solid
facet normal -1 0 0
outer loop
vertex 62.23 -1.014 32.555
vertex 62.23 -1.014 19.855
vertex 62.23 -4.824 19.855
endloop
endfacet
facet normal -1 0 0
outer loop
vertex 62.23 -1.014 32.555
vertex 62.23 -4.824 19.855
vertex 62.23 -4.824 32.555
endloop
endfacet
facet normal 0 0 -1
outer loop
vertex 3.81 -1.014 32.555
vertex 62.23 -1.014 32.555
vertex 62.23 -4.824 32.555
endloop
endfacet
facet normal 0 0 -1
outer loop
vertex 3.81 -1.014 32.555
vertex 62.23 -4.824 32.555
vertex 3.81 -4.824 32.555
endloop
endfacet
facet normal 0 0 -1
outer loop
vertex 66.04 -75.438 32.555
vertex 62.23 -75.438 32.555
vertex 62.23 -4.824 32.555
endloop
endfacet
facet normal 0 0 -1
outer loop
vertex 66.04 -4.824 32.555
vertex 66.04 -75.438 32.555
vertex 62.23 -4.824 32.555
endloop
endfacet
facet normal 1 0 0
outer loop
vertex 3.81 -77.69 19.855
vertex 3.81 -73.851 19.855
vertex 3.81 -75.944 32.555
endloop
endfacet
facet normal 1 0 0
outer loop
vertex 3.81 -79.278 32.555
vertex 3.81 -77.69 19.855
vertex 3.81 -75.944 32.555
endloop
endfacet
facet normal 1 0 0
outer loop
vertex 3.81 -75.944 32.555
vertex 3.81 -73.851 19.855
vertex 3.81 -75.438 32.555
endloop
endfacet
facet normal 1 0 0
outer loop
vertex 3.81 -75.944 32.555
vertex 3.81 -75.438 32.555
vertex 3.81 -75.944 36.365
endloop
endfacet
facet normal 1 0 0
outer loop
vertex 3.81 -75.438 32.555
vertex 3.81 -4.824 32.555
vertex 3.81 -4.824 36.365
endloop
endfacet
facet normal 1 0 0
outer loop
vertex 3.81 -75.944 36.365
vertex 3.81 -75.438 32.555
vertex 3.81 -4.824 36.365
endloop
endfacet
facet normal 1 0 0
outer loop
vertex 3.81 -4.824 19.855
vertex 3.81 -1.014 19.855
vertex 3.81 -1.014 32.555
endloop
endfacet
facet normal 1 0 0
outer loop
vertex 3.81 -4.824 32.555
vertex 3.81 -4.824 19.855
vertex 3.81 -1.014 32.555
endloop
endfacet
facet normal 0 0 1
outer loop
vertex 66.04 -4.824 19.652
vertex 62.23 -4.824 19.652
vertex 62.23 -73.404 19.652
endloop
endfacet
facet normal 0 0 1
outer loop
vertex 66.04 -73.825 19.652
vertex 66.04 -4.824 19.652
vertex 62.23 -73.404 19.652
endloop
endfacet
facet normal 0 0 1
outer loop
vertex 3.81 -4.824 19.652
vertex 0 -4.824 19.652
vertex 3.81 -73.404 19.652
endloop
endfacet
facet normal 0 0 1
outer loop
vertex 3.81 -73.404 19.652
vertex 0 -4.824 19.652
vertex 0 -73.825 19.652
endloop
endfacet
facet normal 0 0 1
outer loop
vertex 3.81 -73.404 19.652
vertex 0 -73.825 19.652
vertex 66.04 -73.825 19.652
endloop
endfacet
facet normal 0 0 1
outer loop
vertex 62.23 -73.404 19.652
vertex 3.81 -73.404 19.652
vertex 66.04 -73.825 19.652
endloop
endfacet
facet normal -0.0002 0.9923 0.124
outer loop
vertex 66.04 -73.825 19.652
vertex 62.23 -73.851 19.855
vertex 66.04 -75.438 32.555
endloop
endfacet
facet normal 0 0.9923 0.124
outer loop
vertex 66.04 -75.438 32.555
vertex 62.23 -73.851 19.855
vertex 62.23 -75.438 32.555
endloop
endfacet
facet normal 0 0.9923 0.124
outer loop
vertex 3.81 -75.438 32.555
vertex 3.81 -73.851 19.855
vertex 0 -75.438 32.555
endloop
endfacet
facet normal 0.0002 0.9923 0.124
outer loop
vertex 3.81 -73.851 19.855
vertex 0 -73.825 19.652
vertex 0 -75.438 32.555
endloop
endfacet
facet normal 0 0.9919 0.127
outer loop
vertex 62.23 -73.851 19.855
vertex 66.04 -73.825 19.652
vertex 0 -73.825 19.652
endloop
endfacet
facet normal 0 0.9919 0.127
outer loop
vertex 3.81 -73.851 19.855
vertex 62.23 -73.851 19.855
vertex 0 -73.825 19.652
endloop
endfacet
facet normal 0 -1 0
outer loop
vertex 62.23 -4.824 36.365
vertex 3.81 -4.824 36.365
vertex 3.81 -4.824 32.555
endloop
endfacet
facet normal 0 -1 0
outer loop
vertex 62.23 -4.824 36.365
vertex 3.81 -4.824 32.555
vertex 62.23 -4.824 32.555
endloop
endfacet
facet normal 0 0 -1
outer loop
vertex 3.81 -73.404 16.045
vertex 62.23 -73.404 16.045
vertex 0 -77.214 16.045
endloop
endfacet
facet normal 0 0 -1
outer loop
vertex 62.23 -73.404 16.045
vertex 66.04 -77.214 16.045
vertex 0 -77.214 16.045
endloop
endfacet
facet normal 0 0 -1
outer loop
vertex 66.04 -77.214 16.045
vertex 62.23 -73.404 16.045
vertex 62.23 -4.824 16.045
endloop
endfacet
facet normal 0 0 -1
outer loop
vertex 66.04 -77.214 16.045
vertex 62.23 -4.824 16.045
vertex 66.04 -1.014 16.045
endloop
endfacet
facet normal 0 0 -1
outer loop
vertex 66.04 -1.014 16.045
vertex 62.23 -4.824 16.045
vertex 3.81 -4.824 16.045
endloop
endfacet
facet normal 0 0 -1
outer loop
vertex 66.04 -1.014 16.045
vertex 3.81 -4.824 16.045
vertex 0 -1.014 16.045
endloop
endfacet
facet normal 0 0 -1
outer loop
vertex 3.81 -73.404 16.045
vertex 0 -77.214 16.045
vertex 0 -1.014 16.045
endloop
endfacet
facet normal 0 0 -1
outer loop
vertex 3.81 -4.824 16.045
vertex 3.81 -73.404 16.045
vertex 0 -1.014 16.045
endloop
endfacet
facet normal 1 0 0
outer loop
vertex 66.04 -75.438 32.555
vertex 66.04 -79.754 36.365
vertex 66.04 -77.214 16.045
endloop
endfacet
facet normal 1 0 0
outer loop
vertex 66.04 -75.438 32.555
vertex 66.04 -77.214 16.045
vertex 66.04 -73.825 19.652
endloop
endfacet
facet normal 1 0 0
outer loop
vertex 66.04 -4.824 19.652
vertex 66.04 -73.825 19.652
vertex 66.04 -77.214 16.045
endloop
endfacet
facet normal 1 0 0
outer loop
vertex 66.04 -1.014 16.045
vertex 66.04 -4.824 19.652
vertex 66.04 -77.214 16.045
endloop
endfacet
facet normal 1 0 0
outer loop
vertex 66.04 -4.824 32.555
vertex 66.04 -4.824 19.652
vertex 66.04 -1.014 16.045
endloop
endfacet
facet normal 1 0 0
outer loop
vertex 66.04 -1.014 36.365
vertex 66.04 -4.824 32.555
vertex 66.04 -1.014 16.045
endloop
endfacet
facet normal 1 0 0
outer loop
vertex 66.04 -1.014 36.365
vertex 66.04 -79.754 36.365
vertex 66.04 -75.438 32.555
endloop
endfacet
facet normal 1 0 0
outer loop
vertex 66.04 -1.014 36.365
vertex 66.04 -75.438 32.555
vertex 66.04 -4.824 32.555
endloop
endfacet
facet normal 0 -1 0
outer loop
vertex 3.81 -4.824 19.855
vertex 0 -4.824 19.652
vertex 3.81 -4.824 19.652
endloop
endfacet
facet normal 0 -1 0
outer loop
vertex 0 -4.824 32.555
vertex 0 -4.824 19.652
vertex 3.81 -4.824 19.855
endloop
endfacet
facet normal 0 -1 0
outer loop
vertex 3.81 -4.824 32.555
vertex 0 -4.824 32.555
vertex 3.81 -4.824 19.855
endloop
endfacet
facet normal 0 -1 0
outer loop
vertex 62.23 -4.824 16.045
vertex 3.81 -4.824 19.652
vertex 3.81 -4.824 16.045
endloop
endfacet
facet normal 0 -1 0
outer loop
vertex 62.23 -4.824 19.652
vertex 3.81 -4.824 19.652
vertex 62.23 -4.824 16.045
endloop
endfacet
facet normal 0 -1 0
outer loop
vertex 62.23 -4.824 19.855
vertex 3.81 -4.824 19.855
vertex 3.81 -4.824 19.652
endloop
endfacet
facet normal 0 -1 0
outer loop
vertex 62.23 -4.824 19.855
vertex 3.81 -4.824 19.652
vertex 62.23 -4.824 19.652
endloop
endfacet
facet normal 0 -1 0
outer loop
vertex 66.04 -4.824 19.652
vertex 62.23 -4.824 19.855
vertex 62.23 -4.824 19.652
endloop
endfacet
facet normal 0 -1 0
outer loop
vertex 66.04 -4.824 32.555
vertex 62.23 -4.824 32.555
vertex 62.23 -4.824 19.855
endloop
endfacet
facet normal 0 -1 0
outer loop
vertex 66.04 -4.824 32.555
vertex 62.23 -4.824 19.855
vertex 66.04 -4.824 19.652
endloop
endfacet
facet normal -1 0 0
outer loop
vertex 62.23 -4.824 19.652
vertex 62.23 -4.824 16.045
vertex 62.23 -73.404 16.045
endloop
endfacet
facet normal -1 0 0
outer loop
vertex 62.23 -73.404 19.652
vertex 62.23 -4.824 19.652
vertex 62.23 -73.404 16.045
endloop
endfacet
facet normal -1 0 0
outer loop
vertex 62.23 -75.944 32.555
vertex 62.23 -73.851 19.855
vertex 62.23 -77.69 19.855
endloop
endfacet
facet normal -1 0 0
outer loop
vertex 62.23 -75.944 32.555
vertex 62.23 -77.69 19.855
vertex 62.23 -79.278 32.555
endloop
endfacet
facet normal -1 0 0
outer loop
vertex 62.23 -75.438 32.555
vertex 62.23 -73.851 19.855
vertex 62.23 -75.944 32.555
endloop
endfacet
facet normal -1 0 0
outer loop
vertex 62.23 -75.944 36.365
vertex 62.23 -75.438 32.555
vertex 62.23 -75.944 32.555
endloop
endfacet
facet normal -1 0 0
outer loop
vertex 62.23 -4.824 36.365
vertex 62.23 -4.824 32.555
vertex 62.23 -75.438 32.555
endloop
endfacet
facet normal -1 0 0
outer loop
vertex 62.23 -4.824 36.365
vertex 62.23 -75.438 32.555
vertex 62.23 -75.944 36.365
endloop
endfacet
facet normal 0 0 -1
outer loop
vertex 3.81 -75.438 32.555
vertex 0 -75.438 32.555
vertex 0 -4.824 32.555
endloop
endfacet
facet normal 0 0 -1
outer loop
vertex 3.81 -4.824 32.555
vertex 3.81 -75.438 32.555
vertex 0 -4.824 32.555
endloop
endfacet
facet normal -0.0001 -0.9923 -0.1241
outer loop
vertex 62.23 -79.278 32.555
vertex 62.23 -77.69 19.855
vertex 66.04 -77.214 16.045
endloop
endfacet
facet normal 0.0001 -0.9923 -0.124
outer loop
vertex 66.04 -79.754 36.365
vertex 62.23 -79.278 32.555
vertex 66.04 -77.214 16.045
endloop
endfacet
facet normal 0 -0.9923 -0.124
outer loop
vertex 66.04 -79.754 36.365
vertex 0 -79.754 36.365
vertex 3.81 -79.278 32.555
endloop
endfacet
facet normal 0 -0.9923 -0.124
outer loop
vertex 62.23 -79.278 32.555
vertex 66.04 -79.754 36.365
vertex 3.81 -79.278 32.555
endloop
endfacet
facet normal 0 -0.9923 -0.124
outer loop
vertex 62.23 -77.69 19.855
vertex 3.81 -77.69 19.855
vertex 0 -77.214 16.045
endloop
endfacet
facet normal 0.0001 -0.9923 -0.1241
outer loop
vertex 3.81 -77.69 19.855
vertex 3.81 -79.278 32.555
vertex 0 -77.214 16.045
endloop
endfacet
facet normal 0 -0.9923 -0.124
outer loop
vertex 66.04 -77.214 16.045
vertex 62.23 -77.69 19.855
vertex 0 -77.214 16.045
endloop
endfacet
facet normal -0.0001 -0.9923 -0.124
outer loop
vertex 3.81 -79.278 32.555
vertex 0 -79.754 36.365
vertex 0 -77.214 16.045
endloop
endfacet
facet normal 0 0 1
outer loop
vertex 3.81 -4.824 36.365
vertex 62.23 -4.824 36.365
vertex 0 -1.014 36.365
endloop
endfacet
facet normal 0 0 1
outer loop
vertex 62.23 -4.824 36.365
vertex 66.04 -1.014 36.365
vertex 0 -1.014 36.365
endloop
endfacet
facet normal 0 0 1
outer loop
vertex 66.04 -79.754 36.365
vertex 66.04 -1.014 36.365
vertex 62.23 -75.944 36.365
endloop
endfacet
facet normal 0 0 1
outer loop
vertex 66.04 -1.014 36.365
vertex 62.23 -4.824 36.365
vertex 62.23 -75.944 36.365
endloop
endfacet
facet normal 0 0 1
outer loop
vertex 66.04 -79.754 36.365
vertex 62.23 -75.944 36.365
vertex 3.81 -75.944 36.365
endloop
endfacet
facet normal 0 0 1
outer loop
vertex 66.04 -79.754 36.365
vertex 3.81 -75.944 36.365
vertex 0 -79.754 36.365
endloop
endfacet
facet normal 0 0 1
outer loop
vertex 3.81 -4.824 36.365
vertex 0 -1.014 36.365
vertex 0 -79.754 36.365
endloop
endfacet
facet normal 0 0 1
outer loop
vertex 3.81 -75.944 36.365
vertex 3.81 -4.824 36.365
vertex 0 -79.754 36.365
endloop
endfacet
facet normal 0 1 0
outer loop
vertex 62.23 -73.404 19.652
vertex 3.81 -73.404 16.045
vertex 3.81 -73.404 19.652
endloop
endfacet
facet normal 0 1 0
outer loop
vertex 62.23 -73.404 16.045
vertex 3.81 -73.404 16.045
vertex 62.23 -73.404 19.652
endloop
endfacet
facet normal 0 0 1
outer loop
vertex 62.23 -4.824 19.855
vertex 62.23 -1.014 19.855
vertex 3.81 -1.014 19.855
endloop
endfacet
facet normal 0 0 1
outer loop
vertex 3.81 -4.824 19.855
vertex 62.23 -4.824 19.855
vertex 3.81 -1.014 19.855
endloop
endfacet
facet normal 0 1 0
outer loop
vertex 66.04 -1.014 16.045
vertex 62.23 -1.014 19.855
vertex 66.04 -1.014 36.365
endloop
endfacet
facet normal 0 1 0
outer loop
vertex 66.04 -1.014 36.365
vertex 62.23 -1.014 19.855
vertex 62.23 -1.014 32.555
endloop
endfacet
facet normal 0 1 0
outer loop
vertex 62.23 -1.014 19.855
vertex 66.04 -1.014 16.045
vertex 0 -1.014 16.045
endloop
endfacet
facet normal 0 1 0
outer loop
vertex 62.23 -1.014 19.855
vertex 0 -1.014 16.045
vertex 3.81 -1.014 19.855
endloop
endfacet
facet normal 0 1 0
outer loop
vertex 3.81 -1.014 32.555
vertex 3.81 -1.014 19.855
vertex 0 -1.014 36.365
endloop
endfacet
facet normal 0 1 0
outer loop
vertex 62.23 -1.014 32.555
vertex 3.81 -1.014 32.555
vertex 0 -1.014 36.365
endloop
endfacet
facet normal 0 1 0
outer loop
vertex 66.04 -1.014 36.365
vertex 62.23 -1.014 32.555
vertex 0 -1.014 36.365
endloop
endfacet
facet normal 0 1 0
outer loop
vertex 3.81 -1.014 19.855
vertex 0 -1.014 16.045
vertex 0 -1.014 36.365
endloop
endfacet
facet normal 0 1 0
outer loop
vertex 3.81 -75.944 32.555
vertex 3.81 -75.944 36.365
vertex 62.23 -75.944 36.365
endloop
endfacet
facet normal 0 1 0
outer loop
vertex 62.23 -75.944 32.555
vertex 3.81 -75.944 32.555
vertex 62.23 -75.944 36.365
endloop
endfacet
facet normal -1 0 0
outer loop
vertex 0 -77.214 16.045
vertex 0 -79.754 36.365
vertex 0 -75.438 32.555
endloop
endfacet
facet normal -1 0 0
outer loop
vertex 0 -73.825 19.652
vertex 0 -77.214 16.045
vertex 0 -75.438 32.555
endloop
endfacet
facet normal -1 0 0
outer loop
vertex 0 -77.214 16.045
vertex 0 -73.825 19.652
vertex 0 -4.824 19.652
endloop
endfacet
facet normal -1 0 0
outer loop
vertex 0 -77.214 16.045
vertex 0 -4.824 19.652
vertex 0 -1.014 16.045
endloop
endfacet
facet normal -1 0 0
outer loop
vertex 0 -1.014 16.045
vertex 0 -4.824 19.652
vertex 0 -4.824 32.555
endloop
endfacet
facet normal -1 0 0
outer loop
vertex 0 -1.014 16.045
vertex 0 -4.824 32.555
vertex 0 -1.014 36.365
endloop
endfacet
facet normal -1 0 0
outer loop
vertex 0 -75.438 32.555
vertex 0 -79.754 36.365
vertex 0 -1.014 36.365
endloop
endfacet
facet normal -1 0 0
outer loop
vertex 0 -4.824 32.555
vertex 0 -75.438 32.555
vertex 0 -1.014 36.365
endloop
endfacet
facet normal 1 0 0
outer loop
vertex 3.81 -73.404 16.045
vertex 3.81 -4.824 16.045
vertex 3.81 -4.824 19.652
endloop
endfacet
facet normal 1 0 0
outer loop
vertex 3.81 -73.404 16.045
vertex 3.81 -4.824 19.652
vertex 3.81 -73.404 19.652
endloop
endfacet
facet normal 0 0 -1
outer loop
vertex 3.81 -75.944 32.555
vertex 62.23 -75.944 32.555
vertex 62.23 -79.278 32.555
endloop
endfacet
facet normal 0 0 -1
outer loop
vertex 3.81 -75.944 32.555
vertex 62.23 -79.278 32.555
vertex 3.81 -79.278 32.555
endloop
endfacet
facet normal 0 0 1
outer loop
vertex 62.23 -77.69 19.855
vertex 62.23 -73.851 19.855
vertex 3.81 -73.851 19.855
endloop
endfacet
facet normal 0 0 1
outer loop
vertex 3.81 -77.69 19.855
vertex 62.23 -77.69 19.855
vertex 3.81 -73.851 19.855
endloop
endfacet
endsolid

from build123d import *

# Parameters (mm, degrees)
F1_DEPTH = 66.04
F2_W     = 58.42
F2_H     = 71.12
F3_DEPTH = 3.81
F4_W     = 58.42
F4_H     = 12.7
F5_DEPTH = 101.6
F6_W     = 58.42
F6_H     = 68.58
F7_DEPTH = 25.4


with BuildPart() as f1:
    # F0 (on Right) → F1 (new body)
    with BuildSketch(Plane.YZ):
        Polygon((-79.753995, 36.364574), (-77.213995, 16.044574), (-1.013995, 16.044574), (-1.013995, 36.364574), align=None)
        Polygon((-75.438095, 32.554574), (-4.823995, 32.554574), (-4.823995, 19.651505), (-73.825211, 19.651505), align=None, mode=Mode.SUBTRACT)
    extrude(amount=F1_DEPTH)

    # F2 (on face) → F3 (cut)
    with BuildSketch(Plane.XY.offset(36.364574)):
        with Locations((33.02, -40.383995)):
            Rectangle(F2_W, F2_H)
    extrude(amount=-F3_DEPTH, mode=Mode.SUBTRACT)

    # F4 (on face) → F5 (cut)
    with BuildSketch(Plane(origin=(0, -1.013995, 0), x_dir=(-1, 0, 0), z_dir=(0, 1, 0))):
        with Locations((-33.02, 26.204574)):
            Rectangle(F4_W, F4_H)
    extrude(amount=-F5_DEPTH, mode=Mode.SUBTRACT)

    # F6 (on face) → F7 (cut)
    with BuildSketch(Plane(origin=(0, 0, 16.044574), x_dir=(1, 0, 0), z_dir=(0, 0, -1))):
        with Locations((33.02, 39.113995)):
            Rectangle(F6_W, F6_H)
    extrude(amount=-F7_DEPTH, mode=Mode.SUBTRACT)


solid = f1.part
